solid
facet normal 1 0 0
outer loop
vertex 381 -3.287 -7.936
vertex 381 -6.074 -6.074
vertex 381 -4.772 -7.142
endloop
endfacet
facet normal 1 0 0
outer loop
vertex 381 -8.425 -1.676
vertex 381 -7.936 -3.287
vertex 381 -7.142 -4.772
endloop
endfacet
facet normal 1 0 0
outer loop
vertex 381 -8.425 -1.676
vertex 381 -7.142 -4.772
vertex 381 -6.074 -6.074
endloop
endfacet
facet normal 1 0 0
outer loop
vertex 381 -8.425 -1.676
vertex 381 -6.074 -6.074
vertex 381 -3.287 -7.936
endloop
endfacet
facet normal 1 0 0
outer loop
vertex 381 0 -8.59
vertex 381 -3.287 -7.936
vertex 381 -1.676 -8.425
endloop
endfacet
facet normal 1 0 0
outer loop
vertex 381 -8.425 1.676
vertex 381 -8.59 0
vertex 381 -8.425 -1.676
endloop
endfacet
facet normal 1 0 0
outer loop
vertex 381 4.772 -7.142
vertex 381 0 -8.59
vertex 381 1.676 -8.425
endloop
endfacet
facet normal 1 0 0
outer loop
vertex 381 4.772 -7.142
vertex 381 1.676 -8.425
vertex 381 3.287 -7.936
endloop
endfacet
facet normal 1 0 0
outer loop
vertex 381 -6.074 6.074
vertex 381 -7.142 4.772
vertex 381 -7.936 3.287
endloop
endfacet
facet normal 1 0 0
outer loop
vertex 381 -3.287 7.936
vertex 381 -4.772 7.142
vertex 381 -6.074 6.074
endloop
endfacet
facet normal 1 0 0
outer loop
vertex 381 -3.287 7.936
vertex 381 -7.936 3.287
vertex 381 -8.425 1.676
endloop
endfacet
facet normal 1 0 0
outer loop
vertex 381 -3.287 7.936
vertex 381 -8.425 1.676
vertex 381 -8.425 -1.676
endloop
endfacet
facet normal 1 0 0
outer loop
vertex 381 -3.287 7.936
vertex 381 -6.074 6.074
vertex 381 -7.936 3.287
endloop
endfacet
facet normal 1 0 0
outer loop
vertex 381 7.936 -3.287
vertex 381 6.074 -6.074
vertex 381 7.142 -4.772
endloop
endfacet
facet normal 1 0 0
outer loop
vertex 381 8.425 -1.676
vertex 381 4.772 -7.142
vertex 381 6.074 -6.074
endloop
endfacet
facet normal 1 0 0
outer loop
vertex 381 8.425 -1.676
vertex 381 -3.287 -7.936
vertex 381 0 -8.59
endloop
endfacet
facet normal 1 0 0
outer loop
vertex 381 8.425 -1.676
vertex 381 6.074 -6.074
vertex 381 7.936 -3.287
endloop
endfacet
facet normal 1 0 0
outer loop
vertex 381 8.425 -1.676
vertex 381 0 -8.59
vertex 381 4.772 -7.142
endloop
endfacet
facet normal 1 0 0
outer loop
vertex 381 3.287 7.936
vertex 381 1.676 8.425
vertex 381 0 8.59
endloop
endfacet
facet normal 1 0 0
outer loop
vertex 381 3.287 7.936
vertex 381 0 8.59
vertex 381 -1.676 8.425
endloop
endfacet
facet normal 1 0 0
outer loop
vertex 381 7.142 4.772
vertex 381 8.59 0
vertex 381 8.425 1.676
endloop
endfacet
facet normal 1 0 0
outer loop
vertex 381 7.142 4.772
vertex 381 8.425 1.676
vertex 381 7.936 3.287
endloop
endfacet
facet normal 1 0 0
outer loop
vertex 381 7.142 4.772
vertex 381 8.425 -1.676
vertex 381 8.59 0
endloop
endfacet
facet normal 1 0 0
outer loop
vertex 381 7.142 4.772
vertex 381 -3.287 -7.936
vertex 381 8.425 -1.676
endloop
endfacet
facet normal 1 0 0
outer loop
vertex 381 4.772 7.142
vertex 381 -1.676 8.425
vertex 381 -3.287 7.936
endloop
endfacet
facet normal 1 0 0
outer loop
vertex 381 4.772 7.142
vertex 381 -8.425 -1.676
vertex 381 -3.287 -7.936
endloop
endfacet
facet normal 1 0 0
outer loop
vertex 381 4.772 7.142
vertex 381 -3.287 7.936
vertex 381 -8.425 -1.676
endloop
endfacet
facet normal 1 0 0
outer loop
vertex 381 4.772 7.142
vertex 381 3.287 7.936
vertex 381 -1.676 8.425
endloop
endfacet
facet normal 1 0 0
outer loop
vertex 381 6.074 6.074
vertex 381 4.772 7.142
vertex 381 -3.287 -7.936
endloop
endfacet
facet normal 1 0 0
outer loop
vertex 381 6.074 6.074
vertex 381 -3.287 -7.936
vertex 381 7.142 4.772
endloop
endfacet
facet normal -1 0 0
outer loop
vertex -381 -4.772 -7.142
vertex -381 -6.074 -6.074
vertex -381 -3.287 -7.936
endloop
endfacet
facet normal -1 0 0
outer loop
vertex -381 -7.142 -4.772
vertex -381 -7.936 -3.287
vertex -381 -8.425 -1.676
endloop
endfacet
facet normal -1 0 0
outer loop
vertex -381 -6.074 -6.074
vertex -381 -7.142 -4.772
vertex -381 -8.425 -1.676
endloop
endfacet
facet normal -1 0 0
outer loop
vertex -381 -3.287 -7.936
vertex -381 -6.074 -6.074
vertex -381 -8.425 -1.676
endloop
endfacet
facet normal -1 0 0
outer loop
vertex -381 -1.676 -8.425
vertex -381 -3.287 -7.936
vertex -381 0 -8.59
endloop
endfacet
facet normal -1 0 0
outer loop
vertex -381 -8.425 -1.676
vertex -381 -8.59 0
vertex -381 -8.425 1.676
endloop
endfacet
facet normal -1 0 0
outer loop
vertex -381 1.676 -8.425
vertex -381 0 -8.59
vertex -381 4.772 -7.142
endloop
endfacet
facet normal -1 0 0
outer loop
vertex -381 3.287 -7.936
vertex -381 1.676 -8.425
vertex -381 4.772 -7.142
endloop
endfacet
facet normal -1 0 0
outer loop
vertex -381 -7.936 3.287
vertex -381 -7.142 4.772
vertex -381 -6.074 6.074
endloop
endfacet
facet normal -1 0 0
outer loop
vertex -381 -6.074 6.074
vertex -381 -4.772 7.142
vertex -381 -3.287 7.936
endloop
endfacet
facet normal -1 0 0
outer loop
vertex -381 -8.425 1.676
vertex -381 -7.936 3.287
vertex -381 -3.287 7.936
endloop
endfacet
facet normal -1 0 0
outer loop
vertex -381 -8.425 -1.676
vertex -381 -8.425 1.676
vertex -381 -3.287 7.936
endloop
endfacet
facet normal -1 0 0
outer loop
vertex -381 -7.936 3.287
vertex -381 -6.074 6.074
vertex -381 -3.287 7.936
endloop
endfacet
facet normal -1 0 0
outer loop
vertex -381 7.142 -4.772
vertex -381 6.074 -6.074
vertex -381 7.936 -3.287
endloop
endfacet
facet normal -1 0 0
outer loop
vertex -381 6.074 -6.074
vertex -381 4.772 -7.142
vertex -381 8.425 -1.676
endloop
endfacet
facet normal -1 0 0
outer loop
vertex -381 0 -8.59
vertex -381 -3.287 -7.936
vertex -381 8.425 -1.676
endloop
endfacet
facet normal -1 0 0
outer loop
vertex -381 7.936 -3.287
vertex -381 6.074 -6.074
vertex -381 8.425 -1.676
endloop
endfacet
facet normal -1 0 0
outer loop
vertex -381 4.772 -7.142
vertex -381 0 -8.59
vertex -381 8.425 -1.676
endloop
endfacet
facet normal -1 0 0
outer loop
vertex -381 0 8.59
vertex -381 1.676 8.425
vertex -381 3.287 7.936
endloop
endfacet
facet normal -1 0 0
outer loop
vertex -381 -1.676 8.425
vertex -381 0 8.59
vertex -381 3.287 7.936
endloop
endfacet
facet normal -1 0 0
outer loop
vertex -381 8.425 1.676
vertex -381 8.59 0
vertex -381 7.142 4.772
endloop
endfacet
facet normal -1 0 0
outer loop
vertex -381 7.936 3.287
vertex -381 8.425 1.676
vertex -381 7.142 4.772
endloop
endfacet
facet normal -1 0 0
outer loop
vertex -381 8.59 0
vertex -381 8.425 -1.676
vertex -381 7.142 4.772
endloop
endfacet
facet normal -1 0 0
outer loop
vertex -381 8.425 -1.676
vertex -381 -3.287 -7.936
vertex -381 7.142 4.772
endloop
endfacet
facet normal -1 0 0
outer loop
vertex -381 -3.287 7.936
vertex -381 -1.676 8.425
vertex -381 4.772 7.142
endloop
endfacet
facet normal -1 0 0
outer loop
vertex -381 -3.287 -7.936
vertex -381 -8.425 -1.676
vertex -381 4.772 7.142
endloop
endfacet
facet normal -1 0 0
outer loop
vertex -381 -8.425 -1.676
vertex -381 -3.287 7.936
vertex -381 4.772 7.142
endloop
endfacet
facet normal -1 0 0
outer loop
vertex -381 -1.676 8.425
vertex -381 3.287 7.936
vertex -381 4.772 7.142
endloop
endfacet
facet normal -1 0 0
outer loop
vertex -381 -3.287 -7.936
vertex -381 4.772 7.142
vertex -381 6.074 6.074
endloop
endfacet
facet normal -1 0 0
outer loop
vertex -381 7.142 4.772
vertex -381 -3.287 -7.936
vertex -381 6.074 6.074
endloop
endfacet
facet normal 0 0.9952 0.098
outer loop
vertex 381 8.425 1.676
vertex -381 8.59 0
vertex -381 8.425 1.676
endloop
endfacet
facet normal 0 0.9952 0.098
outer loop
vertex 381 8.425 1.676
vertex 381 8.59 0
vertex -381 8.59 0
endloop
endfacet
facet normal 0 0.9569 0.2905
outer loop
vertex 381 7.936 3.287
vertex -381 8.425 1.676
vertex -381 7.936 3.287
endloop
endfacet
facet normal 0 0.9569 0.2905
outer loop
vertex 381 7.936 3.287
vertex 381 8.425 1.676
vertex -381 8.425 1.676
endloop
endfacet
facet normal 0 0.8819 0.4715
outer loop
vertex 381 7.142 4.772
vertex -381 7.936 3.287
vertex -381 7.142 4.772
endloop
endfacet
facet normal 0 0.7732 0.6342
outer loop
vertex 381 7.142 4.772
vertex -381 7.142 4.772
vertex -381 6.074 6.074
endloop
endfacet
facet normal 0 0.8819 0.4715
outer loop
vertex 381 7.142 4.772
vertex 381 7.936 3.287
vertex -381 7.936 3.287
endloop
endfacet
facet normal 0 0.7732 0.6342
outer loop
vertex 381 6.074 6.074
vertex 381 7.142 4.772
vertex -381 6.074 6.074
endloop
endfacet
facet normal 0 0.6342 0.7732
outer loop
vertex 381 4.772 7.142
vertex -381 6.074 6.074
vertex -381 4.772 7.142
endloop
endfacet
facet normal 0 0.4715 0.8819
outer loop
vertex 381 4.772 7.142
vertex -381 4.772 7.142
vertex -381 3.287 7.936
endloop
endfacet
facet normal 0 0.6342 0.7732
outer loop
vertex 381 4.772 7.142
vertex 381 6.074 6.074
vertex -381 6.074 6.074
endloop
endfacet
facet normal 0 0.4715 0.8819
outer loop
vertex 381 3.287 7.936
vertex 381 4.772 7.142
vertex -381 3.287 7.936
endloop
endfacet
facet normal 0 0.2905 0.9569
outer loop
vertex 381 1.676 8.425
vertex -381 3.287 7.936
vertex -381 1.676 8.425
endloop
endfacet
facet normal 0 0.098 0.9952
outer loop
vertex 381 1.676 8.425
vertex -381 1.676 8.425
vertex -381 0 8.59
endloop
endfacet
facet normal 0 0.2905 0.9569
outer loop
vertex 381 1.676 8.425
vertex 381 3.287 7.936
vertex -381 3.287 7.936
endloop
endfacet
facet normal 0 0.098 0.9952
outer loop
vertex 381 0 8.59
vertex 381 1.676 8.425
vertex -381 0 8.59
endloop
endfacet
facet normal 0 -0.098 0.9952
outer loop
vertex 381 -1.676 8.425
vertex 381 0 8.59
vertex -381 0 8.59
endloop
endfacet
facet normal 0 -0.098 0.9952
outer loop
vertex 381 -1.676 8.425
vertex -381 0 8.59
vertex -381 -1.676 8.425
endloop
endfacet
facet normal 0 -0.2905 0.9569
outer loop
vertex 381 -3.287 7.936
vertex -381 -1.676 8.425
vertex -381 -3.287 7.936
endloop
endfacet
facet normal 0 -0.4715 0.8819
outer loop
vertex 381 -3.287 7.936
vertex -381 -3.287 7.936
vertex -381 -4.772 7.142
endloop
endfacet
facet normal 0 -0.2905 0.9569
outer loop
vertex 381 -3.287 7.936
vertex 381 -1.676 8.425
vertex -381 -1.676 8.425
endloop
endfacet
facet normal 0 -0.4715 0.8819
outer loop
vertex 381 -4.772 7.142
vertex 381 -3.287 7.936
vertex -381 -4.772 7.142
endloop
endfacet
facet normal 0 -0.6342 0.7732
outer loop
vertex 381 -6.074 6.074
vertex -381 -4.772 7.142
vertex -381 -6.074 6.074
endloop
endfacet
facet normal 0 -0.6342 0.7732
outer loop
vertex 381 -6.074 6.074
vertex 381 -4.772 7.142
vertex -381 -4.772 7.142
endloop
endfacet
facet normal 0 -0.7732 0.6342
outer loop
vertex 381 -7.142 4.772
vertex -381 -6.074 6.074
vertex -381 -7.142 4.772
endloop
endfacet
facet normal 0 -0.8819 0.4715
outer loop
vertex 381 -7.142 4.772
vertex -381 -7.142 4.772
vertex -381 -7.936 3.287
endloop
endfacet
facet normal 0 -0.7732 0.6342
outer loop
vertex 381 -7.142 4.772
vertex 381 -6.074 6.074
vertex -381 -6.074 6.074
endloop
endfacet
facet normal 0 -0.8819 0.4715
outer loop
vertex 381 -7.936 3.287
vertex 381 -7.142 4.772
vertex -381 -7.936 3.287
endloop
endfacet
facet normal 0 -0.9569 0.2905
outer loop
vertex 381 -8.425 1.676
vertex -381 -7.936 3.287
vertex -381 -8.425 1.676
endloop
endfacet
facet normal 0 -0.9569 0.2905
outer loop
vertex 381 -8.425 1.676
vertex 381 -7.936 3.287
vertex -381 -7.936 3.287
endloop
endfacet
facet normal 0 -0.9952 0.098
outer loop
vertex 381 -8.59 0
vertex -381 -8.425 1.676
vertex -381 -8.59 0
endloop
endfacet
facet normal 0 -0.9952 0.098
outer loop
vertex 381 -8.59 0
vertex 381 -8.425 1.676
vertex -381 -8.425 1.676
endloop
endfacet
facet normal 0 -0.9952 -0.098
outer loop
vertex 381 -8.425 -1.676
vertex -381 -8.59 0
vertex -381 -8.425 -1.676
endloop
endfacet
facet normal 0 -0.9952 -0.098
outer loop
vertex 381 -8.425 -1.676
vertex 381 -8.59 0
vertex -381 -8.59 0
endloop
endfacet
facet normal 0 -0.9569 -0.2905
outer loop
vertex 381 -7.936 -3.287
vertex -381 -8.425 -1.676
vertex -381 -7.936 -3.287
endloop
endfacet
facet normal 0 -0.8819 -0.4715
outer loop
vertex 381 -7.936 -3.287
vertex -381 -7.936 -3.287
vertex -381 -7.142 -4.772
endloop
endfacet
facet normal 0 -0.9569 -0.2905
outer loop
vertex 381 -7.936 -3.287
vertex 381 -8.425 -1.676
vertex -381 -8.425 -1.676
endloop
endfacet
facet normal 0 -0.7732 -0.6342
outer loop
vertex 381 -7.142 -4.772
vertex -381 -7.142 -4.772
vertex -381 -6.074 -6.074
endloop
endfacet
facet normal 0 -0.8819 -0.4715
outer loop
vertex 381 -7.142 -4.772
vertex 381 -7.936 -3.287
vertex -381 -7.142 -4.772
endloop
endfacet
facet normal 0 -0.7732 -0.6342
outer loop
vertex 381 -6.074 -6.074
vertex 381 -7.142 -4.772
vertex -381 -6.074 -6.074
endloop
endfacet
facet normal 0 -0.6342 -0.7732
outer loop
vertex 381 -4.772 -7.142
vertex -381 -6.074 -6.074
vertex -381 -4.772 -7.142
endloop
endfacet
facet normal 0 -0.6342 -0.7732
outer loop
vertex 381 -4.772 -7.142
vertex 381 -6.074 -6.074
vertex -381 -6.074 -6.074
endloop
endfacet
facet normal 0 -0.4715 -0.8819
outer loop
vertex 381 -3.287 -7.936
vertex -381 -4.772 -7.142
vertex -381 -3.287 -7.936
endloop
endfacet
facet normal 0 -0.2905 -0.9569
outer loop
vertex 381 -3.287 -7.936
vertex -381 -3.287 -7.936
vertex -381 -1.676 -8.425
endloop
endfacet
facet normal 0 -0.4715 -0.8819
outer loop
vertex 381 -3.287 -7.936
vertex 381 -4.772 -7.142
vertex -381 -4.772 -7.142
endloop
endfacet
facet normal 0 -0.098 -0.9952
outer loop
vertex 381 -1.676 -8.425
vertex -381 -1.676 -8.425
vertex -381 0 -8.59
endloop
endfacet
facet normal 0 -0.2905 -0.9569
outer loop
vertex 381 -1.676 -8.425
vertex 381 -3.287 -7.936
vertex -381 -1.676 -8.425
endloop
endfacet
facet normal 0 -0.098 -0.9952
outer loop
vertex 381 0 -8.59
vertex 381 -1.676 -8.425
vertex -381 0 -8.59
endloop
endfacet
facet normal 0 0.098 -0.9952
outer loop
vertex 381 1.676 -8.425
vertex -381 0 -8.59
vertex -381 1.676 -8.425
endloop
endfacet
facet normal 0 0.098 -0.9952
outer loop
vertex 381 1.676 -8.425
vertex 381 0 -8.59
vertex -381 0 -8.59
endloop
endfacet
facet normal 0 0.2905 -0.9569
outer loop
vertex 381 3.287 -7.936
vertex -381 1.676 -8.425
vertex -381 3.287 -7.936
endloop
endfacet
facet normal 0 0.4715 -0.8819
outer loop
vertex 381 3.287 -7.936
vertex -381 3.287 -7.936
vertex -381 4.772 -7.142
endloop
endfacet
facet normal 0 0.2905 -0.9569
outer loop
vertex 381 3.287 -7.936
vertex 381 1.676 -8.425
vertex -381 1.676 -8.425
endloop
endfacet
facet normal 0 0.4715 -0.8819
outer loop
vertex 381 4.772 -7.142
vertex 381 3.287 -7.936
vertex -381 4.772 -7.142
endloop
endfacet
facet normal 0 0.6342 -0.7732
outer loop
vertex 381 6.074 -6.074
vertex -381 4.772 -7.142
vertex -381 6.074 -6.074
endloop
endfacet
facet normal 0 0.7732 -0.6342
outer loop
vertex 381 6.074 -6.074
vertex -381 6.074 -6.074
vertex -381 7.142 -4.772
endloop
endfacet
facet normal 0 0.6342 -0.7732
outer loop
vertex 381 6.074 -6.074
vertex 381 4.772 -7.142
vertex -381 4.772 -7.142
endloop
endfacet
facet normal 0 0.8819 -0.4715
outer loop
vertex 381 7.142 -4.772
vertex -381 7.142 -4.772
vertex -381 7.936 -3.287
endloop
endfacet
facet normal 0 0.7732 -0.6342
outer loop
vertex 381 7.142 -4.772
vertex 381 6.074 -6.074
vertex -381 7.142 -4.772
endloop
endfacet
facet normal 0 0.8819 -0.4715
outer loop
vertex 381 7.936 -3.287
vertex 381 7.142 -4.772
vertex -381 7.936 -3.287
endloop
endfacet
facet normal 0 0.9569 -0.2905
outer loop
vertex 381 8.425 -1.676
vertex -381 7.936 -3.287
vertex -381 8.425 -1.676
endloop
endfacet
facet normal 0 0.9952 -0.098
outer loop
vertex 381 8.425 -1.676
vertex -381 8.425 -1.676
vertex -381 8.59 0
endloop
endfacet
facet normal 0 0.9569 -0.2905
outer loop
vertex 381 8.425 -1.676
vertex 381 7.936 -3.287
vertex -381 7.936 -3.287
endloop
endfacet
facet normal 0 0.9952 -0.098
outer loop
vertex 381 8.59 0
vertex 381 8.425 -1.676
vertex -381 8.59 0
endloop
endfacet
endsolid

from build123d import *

# Parameters (mm, degrees)
F0_R          = 59.6501704978
F1_DEPTH      = 304.8
F1_DEPTH_BACK = 304.8
F2_R          = 59.6501704978
F2_R_2        = 21.0714216583
F3_DEPTH      = 609.601
F4_R          = 21.0714216583
F4_R_2        = 8.5899800626
F5_DEPTH      = 609.601
F6_DEPTH      = 152.4
F7_DEPTH      = 152.4
F8_DEPTH      = 76.2
F9_DEPTH      = 76.2


with BuildPart() as f1:
    # F0 (on Right) → F1 (new body, two sides)
    with BuildSketch(Plane.YZ) as f1_sk:
        Circle(F0_R)
    extrude(amount=F1_DEPTH)
    extrude(f1_sk.sketch, amount=-F1_DEPTH_BACK)

    # F2 (on face) → F3 (cut, through all)
    with BuildSketch(Plane.YZ.offset(304.8)):
        Circle(F2_R)
        Circle(F2_R_2, mode=Mode.SUBTRACT)
    extrude(amount=-F3_DEPTH, mode=Mode.SUBTRACT)

    # F4 (on face) → F5 (cut, through all)
    with BuildSketch(Plane.YZ.offset(304.8)):
        Circle(F4_R)
        Circle(F4_R_2, mode=Mode.SUBTRACT)
    extrude(amount=-F5_DEPTH, mode=Mode.SUBTRACT)

    # F6 (add): a face of the model
    f6_faces = [f1.faces().sort_by_distance(p)[0] for p in [
        (304.8, 0, 0),
    ]]
    extrude(f6_faces, amount=F6_DEPTH)

    # F7 (add): a face of the model
    f7_faces = [f1.faces().sort_by_distance(p)[0] for p in [
        (-304.8, 0, 0),
    ]]
    extrude(f7_faces, amount=F7_DEPTH)

    # F8 (cut): a face of the model
    f8_faces = [f1.faces().sort_by_distance(p)[0] for p in [
        (457.2, 0, 0),
    ]]
    extrude(f8_faces, amount=-F8_DEPTH, mode=Mode.SUBTRACT)

    # F9 (cut): a face of the model
    f9_faces = [f1.faces().sort_by_distance(p)[0] for p in [
        (-457.2, 0, 0),
    ]]
    extrude(f9_faces, amount=-F9_DEPTH, mode=Mode.SUBTRACT)


solid = f1.part
